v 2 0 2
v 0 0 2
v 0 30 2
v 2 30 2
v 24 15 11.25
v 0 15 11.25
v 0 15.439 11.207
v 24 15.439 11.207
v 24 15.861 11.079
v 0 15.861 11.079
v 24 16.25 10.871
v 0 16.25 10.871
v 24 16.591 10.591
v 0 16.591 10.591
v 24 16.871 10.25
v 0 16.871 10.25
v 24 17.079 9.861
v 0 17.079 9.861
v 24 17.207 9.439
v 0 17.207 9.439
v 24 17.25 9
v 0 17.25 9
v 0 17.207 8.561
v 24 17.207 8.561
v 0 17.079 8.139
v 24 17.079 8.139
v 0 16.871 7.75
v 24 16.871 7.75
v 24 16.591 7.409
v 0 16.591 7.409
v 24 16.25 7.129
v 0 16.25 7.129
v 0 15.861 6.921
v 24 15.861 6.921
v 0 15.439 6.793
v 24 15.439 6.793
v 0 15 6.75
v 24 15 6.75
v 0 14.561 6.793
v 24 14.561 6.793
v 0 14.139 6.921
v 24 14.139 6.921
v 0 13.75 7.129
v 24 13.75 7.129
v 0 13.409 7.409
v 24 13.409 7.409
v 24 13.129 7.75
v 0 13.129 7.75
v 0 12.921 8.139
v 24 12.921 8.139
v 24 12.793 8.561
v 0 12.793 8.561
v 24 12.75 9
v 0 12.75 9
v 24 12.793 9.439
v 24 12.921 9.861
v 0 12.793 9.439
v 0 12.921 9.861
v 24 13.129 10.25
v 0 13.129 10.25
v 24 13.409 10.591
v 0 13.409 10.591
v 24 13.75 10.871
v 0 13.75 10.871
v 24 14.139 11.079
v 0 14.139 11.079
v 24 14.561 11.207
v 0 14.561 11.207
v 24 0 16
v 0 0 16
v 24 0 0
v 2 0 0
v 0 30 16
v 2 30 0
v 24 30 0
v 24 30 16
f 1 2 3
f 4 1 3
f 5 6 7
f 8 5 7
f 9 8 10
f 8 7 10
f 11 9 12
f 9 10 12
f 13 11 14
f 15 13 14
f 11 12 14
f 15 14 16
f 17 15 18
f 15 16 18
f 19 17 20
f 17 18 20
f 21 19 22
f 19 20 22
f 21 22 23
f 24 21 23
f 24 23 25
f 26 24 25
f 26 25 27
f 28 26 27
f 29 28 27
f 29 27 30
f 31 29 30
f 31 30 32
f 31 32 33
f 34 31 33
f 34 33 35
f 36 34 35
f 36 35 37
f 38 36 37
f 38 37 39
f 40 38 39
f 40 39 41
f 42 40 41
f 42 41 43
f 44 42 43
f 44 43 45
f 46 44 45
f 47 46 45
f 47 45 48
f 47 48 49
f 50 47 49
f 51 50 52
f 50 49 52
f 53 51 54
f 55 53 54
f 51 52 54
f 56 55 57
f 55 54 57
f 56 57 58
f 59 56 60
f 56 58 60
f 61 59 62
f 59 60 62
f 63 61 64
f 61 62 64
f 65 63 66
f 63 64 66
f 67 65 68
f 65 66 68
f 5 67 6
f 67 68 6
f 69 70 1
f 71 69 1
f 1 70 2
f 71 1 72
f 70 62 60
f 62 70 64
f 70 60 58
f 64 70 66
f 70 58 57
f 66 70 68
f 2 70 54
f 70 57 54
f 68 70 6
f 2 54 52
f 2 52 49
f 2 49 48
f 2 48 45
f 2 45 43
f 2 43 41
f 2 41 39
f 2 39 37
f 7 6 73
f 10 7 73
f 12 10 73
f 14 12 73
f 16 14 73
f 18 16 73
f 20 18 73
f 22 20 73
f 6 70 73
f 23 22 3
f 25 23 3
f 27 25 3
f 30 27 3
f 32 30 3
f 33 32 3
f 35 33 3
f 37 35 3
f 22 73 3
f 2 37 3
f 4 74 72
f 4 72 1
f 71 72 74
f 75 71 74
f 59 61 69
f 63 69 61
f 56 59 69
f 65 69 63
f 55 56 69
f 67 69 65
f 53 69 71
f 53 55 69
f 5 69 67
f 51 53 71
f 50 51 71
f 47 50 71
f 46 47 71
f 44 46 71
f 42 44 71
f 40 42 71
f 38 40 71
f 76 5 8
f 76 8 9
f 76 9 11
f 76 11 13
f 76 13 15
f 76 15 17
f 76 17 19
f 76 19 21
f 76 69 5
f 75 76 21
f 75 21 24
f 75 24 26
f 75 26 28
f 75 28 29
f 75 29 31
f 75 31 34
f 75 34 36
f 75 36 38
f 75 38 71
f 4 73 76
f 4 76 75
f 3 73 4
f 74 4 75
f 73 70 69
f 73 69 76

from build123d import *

# Parameters (mm, degrees)
SKETCH1_W            = 16
SKETCH1_H            = 30
BOSS_EXTRUDE1_DEPTH  = 24
SKETCH2_W            = 2
SKETCH2_H            = 30
CUT_EXTRUDE1_DEPTH   = 2
M4_CLEARANCE_HOLE1_D = 4.5


with BuildPart() as part:
    # Sketch1 → Boss-Extrude1 (new body)
    with BuildSketch(Plane(origin=(0, 0, 0), x_dir=(0, 0, -1), z_dir=(1, 0, 0))):
        with Locations((-8, 15)):
            Rectangle(SKETCH1_W, SKETCH1_H)
    extrude(amount=BOSS_EXTRUDE1_DEPTH)

    # Sketch2 → Cut-Extrude1 (cut)
    with BuildSketch(Plane.ZY):
        with Locations((1, 15)):
            Rectangle(SKETCH2_W, SKETCH2_H)
    extrude(amount=-CUT_EXTRUDE1_DEPTH, mode=Mode.SUBTRACT)

    # M4 Clearance Hole1 (through all)
    with Locations(Plane(origin=(24, 0, 0), x_dir=(0, 0, -1), z_dir=(1, 0, 0))):
        with Locations((-9, 15)):
            Hole(M4_CLEARANCE_HOLE1_D / 2)


solid = part.part
